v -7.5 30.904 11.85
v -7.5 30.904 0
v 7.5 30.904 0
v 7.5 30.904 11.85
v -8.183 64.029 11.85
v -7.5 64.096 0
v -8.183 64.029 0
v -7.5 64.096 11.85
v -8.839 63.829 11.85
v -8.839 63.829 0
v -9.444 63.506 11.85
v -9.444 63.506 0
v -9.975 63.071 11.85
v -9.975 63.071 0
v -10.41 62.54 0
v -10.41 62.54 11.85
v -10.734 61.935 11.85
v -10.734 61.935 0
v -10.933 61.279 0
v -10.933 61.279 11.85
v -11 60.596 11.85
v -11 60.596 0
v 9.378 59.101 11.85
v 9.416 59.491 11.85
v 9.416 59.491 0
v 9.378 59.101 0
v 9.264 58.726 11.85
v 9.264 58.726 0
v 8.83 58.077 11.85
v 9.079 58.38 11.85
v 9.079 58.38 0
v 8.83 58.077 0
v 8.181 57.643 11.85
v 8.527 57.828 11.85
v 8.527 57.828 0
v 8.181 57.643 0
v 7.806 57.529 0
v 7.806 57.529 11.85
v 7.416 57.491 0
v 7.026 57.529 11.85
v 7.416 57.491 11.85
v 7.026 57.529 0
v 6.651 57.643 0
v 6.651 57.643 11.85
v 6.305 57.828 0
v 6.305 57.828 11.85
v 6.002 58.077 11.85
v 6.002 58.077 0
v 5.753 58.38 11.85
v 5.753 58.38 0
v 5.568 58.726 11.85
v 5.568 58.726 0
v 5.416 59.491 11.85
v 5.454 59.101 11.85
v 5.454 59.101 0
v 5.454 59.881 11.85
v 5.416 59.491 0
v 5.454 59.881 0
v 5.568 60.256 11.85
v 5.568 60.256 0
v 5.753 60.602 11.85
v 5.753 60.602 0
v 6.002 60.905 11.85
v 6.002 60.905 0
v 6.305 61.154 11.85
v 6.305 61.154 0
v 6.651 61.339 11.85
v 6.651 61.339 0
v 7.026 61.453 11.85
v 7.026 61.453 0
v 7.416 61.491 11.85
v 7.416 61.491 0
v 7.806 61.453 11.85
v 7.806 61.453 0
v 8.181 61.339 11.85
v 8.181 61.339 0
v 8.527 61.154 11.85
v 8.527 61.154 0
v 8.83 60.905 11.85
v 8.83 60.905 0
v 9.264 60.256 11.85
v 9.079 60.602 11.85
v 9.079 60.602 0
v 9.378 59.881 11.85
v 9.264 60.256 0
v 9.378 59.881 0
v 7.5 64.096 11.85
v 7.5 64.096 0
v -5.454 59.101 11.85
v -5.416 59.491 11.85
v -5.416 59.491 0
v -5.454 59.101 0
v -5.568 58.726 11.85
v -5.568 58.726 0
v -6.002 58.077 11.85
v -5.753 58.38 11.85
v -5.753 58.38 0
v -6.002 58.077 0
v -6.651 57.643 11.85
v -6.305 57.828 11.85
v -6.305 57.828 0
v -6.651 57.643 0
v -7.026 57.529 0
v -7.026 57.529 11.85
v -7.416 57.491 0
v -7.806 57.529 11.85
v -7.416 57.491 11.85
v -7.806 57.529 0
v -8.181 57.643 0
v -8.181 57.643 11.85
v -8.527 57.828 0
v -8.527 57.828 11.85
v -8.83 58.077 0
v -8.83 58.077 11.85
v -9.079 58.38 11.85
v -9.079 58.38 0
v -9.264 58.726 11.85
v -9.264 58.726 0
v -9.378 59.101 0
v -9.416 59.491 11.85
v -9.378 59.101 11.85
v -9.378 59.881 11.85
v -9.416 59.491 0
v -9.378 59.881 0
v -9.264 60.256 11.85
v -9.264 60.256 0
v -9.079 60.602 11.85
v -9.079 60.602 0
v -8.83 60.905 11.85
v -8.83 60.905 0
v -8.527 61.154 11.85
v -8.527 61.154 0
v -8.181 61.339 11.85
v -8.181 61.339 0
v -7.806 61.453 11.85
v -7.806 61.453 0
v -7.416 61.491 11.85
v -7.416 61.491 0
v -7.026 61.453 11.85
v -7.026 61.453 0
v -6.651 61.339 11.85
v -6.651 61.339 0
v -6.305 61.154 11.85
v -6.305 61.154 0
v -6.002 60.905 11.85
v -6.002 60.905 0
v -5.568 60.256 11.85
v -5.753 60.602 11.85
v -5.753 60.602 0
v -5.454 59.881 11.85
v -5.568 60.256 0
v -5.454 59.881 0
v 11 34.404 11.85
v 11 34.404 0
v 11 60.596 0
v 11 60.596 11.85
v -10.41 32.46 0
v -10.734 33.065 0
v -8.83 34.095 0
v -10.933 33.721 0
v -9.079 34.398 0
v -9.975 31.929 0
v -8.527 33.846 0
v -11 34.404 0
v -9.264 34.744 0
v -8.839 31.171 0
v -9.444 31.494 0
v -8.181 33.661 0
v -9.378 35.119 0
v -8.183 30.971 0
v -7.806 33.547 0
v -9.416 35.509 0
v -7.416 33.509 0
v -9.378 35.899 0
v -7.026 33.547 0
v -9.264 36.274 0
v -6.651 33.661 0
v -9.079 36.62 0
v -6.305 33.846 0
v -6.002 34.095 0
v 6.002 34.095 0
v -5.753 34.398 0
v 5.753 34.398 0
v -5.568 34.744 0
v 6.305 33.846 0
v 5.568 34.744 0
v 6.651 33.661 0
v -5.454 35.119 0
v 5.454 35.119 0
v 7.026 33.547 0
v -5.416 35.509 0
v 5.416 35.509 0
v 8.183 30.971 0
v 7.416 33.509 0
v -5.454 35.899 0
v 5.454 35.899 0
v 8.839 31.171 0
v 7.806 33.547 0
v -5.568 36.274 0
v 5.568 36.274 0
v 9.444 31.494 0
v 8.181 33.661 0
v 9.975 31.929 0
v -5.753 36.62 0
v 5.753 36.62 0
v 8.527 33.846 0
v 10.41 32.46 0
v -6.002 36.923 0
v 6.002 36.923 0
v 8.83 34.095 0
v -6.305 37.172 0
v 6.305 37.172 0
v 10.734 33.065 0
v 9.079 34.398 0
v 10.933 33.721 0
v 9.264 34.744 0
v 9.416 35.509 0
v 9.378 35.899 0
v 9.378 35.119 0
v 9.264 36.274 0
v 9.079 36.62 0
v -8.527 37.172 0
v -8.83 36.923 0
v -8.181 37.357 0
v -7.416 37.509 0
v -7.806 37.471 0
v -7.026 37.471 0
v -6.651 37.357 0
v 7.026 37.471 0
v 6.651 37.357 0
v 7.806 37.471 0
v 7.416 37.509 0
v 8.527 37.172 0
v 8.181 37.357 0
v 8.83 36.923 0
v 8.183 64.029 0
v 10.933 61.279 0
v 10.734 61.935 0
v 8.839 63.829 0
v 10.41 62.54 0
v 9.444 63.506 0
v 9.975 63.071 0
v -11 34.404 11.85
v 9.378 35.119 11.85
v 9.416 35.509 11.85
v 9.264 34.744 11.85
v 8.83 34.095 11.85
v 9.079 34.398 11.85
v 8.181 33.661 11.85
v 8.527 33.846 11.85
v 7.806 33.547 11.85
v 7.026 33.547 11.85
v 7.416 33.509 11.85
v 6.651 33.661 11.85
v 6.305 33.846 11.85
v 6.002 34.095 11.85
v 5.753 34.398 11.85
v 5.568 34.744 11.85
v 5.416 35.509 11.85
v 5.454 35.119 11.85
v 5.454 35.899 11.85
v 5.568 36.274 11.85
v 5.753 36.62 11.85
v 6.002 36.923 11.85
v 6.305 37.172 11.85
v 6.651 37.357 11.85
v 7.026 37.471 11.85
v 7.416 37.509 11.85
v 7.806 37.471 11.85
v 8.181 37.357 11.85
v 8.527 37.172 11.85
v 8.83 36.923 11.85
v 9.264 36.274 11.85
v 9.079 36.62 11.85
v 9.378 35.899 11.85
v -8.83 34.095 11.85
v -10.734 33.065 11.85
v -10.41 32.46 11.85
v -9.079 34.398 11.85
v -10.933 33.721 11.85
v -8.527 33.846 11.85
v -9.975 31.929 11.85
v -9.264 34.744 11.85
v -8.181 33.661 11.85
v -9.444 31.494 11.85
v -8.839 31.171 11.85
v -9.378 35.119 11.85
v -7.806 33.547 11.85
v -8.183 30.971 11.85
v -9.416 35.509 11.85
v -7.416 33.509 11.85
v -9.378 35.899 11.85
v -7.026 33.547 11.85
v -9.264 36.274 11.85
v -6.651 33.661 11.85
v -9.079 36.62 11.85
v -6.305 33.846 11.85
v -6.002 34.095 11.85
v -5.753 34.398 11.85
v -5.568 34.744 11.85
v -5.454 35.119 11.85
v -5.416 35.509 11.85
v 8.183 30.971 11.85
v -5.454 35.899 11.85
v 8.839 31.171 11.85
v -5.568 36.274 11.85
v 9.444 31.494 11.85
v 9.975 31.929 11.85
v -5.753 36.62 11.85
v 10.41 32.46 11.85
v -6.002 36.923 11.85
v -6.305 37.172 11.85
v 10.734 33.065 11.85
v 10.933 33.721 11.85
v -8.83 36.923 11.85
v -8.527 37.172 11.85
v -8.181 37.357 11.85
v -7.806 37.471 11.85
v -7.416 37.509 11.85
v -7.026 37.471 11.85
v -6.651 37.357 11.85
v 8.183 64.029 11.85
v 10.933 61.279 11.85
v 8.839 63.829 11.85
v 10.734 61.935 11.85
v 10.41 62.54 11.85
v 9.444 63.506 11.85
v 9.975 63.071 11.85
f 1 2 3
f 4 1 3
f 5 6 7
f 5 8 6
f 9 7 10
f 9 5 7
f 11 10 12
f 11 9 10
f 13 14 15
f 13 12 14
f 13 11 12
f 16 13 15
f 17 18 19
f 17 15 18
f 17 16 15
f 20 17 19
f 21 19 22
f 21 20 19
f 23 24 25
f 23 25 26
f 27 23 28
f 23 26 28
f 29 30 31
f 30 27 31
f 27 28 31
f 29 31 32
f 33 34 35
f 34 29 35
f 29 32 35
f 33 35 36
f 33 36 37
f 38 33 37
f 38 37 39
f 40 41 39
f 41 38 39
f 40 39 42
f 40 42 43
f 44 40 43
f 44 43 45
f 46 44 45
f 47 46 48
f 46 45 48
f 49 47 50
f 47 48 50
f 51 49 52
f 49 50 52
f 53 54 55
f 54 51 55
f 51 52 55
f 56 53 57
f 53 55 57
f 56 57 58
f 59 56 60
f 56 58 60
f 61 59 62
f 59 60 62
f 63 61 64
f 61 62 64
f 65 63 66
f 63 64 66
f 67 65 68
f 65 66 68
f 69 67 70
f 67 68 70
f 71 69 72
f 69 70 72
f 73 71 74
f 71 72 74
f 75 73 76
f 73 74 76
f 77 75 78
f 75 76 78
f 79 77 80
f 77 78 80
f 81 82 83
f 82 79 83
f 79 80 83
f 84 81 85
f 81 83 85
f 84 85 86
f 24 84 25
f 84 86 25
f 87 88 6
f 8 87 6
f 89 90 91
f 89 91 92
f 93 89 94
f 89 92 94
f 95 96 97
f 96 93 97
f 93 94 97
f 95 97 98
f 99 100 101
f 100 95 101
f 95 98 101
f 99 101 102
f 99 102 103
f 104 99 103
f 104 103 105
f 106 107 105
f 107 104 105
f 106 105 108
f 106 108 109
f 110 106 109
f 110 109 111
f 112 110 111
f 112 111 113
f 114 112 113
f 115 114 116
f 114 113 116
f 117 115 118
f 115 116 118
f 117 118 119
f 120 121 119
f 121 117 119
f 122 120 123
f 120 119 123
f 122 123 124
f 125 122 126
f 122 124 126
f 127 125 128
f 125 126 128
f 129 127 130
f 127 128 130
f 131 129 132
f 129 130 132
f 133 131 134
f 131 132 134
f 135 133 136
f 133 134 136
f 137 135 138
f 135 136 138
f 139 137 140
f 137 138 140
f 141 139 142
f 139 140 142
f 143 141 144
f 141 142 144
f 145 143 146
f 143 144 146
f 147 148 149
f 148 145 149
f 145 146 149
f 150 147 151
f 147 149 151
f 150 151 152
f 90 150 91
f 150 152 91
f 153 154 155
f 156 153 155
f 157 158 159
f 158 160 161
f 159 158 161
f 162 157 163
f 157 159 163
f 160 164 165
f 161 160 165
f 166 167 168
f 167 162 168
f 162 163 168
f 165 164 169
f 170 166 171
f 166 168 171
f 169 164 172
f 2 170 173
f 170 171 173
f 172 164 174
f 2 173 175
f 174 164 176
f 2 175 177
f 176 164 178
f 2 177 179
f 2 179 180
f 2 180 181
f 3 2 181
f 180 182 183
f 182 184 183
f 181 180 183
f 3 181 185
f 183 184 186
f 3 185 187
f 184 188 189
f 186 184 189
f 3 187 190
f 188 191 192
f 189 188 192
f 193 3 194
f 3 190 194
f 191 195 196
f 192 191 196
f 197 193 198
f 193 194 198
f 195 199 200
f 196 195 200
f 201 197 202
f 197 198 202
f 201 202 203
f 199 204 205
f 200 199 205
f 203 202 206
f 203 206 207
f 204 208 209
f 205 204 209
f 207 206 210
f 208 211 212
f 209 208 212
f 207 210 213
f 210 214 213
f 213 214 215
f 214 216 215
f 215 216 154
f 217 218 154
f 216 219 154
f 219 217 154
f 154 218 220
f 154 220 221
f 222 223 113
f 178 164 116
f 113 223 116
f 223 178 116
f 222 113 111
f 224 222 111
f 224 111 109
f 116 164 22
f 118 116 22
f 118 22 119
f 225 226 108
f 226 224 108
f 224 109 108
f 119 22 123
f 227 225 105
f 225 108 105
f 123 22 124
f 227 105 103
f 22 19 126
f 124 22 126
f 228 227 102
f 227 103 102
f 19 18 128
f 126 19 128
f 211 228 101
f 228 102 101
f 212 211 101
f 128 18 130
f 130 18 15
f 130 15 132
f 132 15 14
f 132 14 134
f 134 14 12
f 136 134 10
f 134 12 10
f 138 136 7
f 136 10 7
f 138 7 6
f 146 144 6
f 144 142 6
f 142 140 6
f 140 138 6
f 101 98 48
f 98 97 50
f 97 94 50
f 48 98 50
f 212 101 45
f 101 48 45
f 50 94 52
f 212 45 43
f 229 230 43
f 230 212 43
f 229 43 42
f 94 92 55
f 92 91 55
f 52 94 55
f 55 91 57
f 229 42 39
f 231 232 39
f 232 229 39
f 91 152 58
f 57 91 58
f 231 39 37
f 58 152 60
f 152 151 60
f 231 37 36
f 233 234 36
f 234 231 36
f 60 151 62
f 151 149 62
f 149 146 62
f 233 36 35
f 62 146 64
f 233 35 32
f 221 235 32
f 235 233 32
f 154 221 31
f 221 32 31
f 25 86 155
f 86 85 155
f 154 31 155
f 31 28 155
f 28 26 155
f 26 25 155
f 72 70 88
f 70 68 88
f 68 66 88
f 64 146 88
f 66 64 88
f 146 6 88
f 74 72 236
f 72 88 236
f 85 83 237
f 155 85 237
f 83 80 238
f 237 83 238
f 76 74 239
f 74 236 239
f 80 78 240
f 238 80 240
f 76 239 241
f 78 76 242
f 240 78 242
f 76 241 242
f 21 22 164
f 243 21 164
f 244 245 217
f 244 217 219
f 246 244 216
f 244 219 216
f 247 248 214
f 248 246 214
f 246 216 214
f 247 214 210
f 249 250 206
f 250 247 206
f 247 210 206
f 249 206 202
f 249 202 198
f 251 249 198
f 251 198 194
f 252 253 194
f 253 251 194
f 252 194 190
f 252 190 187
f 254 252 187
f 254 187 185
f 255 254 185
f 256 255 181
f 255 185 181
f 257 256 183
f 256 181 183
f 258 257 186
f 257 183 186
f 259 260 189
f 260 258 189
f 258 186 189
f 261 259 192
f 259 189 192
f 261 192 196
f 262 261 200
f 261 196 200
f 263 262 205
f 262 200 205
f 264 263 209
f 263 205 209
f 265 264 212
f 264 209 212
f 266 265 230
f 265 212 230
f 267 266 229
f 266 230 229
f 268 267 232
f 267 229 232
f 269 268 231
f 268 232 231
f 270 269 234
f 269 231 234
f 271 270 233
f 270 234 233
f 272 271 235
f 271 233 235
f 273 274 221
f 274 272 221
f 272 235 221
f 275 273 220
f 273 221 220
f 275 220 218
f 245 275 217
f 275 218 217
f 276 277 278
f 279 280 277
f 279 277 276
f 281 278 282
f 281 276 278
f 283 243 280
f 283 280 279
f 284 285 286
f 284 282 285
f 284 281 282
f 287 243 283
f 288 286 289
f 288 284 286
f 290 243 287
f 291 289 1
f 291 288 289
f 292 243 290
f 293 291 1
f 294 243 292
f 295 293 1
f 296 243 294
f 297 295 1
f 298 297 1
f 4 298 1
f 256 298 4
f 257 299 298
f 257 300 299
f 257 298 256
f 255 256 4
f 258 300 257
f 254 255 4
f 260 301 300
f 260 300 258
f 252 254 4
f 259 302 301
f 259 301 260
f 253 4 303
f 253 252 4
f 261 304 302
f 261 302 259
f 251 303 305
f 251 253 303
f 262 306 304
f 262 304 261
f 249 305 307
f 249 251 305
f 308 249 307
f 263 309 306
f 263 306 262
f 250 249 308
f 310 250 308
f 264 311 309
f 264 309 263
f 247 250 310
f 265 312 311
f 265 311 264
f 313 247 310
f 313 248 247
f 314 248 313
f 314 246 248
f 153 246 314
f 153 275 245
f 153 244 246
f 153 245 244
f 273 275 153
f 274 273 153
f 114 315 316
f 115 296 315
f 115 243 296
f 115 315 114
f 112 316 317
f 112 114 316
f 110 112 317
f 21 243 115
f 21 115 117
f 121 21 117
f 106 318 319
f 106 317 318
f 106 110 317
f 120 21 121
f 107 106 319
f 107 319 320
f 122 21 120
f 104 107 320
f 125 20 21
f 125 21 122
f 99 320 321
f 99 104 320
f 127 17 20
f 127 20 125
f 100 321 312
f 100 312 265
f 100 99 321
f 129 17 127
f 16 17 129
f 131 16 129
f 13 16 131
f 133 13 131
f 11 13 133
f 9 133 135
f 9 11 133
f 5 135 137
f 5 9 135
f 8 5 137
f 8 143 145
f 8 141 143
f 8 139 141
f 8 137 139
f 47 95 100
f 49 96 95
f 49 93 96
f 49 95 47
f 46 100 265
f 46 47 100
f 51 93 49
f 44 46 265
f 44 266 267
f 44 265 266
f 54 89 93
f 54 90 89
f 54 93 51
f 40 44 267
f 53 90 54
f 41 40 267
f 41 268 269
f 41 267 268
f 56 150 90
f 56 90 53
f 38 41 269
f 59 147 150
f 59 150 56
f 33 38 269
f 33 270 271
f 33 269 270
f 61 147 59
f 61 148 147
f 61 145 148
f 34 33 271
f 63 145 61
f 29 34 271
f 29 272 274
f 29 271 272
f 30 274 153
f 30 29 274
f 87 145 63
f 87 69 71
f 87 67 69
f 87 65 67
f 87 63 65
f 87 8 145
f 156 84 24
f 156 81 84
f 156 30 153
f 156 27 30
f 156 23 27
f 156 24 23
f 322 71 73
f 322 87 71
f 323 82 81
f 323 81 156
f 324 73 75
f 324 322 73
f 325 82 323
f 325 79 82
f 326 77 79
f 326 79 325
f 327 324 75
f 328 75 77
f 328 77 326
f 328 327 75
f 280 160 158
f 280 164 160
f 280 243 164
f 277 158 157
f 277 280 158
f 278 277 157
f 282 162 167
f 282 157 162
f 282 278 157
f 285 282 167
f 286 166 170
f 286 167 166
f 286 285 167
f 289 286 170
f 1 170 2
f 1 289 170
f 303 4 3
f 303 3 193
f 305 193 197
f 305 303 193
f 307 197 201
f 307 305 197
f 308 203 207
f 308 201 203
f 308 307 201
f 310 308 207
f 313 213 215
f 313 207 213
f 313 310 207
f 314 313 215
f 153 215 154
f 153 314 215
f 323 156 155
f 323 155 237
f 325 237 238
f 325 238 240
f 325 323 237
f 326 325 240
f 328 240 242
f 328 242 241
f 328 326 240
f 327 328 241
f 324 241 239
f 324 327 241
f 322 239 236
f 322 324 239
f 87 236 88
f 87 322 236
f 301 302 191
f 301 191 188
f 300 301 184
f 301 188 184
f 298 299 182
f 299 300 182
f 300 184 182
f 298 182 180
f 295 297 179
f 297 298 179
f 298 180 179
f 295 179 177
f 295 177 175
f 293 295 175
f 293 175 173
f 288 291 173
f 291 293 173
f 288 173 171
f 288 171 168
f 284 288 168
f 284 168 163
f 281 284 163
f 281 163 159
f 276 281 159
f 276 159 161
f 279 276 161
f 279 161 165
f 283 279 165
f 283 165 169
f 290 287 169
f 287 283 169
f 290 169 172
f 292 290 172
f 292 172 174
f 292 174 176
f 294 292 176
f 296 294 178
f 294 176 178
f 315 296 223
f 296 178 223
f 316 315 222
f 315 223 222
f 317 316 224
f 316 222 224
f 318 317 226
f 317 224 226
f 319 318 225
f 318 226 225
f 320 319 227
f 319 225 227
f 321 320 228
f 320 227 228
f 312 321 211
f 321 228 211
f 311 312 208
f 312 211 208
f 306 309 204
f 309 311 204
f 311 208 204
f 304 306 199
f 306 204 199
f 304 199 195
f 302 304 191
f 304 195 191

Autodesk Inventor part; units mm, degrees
ref_plane "YZ Plane" through (0, 0, 0) normal (1, 0, 0) x (0, 1, 0)
ref_plane "XZ Plane" through (0, 0, 0) normal (0, 1, 0) x (-1, 0, 0)
ref_plane "XY Plane" through (0, 0, 0) normal (0, 0, 1) x (1, 0, 0)
ref_plane "РабПлоскость1" through (0, 0, 0) normal (0, 0, 1) x (1, 0, 0)
sketch "Эскиз1" plane through (0, 0, 0) normal (0, 0, 1) x (1, 0, 0)
  circle A0 centre (7.416, 59.491) radius 2 projected
  circle A1 centre (7.416, 35.509) radius 2 projected
  circle A2 centre (-7.416, 35.509) radius 2 projected
  circle A3 centre (-7.416, 59.491) radius 2 projected
  line L0 (11, 64.0958) -> (-11, 64.0958)
  line L1 (-11, 64.0958) -> (-11, 30.9042)
  line L2 (-11, 30.9042) -> (11, 30.9042)
  line L3 (11, 30.9042) -> (11, 64.0958)
  line L4 (11, 64.0958) -> (-11, 30.9042) construction
  line L5 (7.416, 59.491) -> (-7.416, 35.509) construction
  arc A4 (-24.6917, 37.0776) -> (24.6917, 37.0776) centre (0, 73.5704) ccw projected
  point P0 (0, 0)
  point P1 (0, 47.5)
  dimension "d0" = 22
extrude "Выдавливание1" add sketch "Эскиз1" along normal blind 11.85 contours L3 L2 L1 L0
fillet "Сопряжение1" radius 3.5 4 edges at (-11, 30.9042, 5.925) (11, 30.9042, 5.925) (11, 64.0958, 5.925) (-11, 64.0958, 5.925)
properties part number "Подставка под солноид"
